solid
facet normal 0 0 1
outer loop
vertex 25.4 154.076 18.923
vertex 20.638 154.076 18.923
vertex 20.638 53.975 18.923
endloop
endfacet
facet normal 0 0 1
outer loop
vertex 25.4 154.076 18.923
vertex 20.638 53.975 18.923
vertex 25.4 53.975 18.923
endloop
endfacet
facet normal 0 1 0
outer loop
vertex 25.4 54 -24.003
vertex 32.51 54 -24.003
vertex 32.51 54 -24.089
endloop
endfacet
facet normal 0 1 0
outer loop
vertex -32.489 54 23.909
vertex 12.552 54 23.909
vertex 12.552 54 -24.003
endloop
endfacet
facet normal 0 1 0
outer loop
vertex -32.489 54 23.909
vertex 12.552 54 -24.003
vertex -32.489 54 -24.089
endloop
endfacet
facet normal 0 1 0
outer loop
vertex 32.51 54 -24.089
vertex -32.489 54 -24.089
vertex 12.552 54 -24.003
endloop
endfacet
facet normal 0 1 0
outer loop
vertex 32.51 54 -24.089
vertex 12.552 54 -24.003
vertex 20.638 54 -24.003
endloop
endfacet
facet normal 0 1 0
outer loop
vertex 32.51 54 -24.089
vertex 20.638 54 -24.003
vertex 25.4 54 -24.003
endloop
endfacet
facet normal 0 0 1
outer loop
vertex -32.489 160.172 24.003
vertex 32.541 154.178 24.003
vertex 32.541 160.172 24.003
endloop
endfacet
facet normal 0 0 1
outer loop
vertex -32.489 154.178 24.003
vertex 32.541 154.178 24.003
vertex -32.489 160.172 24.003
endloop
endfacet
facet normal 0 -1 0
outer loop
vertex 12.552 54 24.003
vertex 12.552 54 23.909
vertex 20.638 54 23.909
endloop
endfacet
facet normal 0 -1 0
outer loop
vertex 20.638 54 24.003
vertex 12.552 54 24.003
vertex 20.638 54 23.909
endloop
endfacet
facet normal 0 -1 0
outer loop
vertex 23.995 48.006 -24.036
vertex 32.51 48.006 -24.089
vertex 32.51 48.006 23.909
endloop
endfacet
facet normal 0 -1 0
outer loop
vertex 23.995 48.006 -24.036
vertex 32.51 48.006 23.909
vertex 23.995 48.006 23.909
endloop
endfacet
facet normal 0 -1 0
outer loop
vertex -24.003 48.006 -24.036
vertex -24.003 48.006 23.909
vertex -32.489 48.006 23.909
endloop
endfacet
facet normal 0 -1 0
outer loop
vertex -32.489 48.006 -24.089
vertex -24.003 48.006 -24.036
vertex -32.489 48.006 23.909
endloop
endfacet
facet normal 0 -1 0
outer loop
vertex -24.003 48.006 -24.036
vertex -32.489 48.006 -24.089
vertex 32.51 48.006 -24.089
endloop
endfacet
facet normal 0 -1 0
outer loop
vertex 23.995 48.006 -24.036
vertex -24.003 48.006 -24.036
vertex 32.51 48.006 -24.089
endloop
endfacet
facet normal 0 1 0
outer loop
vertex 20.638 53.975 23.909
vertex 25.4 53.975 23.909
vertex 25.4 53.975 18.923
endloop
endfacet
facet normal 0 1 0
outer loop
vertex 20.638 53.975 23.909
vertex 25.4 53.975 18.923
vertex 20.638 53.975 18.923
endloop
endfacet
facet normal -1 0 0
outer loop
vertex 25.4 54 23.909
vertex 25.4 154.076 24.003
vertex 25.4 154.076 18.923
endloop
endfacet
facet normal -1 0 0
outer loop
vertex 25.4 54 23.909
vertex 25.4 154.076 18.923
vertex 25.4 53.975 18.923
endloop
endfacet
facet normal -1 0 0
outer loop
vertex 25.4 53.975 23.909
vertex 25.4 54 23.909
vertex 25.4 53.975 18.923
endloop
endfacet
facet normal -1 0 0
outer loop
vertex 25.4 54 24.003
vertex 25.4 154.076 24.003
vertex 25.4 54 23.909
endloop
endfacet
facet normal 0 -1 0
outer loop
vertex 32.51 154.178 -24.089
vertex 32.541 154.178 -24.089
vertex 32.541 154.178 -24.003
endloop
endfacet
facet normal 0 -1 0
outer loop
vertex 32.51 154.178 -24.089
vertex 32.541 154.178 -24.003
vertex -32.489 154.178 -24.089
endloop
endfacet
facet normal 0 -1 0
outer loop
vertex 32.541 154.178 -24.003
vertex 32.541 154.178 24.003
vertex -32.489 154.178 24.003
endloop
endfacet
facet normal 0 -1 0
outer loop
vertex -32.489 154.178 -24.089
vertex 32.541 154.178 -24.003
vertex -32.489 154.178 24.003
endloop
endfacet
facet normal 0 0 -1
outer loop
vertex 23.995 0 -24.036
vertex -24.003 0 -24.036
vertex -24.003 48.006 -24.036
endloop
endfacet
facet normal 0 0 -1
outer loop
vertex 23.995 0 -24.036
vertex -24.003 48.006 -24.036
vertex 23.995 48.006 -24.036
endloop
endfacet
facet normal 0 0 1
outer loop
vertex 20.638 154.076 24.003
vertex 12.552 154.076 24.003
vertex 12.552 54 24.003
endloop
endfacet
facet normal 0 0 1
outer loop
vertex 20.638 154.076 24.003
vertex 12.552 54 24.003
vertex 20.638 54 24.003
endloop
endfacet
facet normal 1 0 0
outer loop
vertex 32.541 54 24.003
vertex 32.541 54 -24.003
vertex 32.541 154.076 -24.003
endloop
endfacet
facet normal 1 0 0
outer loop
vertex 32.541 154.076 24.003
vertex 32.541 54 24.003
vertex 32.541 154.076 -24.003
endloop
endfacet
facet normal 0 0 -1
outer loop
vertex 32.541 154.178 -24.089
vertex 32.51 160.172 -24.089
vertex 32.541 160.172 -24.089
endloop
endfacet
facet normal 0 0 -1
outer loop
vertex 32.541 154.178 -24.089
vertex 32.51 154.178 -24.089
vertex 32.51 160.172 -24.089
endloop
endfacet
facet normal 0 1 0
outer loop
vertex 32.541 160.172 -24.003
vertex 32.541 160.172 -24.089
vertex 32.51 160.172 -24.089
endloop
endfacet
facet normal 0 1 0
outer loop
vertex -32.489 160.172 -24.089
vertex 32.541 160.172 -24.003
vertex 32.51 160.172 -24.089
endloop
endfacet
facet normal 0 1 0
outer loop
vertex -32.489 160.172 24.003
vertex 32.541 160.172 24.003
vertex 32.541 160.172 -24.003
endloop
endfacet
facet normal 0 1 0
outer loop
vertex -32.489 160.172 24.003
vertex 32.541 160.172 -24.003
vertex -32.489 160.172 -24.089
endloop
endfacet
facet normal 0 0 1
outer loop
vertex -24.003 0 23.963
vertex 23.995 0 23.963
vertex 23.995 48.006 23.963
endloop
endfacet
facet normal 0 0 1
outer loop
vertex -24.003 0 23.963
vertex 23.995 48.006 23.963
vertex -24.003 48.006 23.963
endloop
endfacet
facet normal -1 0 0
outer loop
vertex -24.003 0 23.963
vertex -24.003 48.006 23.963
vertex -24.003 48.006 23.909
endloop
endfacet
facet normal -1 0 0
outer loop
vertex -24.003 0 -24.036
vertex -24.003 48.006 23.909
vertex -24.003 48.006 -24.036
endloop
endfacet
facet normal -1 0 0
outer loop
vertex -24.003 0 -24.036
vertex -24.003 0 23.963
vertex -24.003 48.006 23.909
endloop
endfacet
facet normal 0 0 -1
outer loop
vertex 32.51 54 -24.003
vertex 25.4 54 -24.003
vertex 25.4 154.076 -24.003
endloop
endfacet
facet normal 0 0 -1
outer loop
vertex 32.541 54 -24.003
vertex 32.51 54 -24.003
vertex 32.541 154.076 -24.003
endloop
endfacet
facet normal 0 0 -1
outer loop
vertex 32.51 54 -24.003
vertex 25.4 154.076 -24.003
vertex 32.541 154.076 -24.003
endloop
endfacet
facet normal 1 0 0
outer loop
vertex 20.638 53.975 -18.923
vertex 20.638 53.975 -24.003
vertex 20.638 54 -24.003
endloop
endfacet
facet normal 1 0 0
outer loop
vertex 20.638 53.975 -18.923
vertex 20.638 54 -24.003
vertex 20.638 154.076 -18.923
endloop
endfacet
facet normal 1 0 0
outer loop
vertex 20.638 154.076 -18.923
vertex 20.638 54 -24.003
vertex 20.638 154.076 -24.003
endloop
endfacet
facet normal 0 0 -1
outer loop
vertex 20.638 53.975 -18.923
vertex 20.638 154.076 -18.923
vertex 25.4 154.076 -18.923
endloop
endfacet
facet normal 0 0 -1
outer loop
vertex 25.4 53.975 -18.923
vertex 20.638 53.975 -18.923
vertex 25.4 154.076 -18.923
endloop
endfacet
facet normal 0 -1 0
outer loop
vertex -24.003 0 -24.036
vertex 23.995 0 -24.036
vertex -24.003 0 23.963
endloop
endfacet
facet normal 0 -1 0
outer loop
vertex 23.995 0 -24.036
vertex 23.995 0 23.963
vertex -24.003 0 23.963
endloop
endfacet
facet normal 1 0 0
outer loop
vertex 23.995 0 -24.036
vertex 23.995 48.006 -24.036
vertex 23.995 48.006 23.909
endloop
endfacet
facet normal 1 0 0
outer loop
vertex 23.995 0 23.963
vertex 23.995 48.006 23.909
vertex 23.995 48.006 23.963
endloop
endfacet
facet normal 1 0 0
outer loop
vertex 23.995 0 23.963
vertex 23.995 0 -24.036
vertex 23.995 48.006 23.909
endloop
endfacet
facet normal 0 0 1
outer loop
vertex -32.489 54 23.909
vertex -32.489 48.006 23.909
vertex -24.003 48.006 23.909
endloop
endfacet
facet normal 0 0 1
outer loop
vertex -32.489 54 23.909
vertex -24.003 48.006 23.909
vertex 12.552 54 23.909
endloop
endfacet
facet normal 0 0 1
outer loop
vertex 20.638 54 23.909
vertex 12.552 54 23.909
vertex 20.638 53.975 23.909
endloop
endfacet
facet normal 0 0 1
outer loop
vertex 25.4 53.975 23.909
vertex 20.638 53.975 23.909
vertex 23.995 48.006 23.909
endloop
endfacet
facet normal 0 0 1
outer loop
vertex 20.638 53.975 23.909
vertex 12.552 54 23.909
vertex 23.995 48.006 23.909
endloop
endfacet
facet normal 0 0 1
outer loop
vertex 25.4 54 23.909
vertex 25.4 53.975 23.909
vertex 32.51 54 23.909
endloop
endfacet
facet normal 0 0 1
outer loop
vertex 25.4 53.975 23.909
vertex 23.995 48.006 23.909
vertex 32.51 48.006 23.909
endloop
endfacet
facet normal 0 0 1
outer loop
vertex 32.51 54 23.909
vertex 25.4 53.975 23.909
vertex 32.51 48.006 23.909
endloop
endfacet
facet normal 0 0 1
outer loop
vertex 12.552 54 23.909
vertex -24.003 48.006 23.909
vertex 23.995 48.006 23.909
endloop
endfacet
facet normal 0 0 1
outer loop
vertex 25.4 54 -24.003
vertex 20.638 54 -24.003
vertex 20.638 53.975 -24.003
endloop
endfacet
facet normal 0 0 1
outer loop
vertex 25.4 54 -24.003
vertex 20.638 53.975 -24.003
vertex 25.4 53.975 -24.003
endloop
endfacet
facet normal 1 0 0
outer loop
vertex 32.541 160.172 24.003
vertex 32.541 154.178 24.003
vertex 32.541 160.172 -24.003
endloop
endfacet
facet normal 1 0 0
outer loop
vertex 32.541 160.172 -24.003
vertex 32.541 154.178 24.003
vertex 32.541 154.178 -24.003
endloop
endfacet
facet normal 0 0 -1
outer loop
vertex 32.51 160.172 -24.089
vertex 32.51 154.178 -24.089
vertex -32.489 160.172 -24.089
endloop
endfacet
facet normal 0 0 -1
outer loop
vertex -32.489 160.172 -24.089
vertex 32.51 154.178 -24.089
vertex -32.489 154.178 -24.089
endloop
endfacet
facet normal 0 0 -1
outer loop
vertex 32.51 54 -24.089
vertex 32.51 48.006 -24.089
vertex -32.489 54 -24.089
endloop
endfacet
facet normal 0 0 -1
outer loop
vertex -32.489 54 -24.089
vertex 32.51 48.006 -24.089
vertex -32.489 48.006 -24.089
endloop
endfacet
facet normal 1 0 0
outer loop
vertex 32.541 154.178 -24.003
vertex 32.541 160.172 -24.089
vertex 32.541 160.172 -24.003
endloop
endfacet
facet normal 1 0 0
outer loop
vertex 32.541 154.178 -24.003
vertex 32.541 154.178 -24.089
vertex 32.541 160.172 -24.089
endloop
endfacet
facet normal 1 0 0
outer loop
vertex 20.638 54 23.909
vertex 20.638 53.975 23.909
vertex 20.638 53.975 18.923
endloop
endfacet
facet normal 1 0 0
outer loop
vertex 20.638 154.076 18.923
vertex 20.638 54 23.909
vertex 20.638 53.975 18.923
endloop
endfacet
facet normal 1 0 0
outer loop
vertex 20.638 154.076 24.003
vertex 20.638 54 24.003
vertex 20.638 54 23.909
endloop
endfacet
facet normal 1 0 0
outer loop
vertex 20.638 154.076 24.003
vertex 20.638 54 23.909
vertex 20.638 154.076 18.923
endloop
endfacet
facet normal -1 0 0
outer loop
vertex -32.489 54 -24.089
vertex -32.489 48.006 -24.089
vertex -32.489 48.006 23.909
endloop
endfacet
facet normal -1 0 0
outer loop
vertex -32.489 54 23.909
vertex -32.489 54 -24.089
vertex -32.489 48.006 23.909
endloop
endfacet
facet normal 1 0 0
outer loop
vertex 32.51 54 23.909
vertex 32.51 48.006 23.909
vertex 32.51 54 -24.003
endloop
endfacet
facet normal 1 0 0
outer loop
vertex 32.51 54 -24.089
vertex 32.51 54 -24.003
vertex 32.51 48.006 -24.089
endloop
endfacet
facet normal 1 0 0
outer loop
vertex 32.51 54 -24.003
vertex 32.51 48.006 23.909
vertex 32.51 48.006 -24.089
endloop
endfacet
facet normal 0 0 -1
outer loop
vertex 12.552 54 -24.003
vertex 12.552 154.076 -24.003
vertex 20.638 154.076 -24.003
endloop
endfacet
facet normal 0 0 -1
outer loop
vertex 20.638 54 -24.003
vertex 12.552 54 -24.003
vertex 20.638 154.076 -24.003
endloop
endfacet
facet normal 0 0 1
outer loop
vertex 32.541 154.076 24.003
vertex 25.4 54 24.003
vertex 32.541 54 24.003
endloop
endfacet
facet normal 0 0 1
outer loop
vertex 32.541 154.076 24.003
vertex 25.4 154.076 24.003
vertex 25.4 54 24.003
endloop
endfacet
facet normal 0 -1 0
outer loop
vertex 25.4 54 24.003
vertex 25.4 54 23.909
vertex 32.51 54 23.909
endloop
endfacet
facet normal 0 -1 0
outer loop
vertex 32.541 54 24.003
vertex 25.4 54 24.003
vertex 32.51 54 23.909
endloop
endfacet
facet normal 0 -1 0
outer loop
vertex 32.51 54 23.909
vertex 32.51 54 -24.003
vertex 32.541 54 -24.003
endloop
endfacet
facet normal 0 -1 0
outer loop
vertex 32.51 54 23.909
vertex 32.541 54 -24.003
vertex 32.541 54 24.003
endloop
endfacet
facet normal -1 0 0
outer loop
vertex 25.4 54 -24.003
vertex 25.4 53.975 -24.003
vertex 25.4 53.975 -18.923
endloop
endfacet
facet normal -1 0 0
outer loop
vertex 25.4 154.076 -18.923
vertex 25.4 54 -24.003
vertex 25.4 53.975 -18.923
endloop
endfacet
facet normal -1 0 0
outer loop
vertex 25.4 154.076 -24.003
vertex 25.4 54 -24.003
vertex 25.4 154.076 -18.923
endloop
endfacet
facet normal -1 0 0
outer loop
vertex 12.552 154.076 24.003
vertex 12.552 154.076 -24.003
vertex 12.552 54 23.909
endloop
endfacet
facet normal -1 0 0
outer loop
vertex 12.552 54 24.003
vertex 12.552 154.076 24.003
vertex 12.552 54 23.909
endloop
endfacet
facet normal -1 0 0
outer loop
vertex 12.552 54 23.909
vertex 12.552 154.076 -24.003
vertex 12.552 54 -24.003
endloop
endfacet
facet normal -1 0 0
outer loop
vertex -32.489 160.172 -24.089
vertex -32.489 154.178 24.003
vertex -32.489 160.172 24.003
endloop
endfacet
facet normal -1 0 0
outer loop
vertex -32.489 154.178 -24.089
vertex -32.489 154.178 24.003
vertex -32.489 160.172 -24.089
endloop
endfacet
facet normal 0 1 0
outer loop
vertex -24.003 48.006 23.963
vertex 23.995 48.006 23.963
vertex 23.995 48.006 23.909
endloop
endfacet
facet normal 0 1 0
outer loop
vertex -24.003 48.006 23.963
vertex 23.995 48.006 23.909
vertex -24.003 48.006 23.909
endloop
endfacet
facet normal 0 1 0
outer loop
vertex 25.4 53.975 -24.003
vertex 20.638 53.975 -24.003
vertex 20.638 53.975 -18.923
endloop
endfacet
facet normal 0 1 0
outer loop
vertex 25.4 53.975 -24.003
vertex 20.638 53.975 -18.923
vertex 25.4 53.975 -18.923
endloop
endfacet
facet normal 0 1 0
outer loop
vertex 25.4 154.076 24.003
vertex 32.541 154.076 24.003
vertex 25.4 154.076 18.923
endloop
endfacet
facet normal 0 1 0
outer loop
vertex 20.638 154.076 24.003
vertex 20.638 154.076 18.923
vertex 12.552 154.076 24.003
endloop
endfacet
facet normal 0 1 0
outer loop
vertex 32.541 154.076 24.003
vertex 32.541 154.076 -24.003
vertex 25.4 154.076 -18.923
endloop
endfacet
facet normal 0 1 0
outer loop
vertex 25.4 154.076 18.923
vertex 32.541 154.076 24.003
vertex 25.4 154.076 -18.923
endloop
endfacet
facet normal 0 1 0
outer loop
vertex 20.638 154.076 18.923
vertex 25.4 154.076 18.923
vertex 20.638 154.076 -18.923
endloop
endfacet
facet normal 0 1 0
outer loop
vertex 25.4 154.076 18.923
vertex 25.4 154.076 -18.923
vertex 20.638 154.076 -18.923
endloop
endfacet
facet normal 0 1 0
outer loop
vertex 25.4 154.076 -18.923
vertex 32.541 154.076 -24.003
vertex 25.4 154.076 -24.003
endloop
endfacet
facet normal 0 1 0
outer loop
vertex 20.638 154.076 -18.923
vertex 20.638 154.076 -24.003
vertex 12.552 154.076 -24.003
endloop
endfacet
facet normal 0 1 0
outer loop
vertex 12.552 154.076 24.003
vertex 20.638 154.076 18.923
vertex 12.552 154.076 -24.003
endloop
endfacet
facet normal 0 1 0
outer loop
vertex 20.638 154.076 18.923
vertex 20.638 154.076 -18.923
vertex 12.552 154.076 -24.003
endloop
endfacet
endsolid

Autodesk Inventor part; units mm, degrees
sketch "Sketch1" plane through (0, 0, 0) normal (0, 1, 0) x (-1, 0, 0)
  line L0 (24.003, -24.0356) -> (-23.9954, -24.0356)
  line L1 (-23.9954, -24.0356) -> (-23.9954, 23.9628)
  line L2 (-23.9954, 23.9628) -> (24.003, 23.9628)
  line L3 (24.003, 23.9628) -> (24.003, -24.0356)
  point P0 (0, 0)
  dimension "d0" = 47.9984
extrude "Extrusion1" add sketch "Sketch1" along normal blind 48.006
ref_plane "Work Plane1" through (0, 48.006, 0) normal (0, 1, 0) x (-1, 0, 0)
sketch "Sketch2" plane through (0, 48.006, 0) normal (0, 1, 0) x (-1, 0, 0)
  line L0 (32.4891, 23.9092) -> (-32.5095, 23.9092)
  line L1 (-32.5095, 23.9092) -> (-32.5095, -24.0892)
  line L2 (-32.5095, -24.0892) -> (32.4891, -24.0892)
  line L3 (32.4891, -24.0892) -> (32.4891, 23.9092)
  point P0 (0, 0)
  dimension "d6" = 64.9986
extrude "Extrusion2" add sketch "Sketch2" along normal blind 5.9944
sketch "Sketch3" plane through (0, 0, 0) normal (0, 0, 1) x (1, 0, 0)
  line L0 (-32.4891, 54.0004) -> (32.5095, 54.0004) projected
  line L1 (32.5413, 154.0764) -> (12.5515, 154.0764)
  line L2 (12.5515, 154.0764) -> (12.5515, 54.0004)
  line L3 (12.5515, 54.0004) -> (32.5413, 54.0004)
  line L4 (32.5413, 54.0004) -> (32.5413, 154.0764)
  point P0 (0, 0)
  dimension "d12" = 19.9898
  dimension "d13" = 100.076
extrude "Extrusion3" add sketch "Sketch3" along normal mid plane 48.006
ref_plane "Work Plane2" through (0, 0, 24.003) normal (0, 0, 1) x (1, 0, 0)
ref_plane "Work Plane3" through (0, 0, -24.003) normal (0, 0, 1) x (1, 0, 0)
sketch "Sketch4" plane through (0, 0, 24.003) normal (0, 0, 1) x (1, 0, 0)
  line L0 (20.6375, 157.1625) -> (25.4, 157.1625)
  line L1 (25.4, 157.1625) -> (25.4, 53.975)
  line L2 (25.4, 53.975) -> (20.6375, 53.975)
  line L3 (20.6375, 53.975) -> (20.6375, 157.1625)
  line L4 (12.5515, 154.0764) -> (12.5515, 54.0004) projected
  point P0 (0, 0)
  dimension "d24" = 4.7625
  dimension "d25" = 8.086
extrude "Extrusion4" cut sketch "Sketch4" against normal blind 5.08
sketch "Sketch6" plane through (0, 0, -24.003) normal (0, 0, 1) x (1, 0, 0)
  line L0 (20.6375, 53.975) -> (20.6375, 154.0764) projected
  line L1 (25.4, 155.575) -> (20.6375, 155.575)
  line L2 (20.6375, 155.575) -> (20.6375, 53.975)
  line L3 (20.6375, 53.975) -> (25.4, 53.975)
  line L4 (25.4, 53.975) -> (25.4, 155.575)
  point P0 (0, 0)
extrude "Extrusion6" cut sketch "Sketch6" along normal blind 5.08
ref_plane "Work Plane4" through (0, 154.178, 0) normal (0, 1, 0) x (-1, 0, 0)
sketch "Sketch7" plane through (0, 154.178, 0) normal (0, 1, 0) x (-1, 0, 0)
  line L0 (-32.5413, 24.003) -> (-32.5413, -24.003) projected
  line L1 (-32.5095, -24.0892) -> (32.4891, -24.0892) projected
  line L2 (-32.5413, 24.003) -> (32.4891, 24.003)
  line L3 (32.4891, 24.003) -> (32.4891, -24.0892)
  line L4 (32.4891, -24.0892) -> (-32.5413, -24.0892)
  line L5 (-32.5413, -24.0892) -> (-32.5413, 24.003)
  point P0 (0, 0)
extrude "Extrusion7" add sketch "Sketch7" along normal blind 5.9944
properties part number "Linear stepper"
